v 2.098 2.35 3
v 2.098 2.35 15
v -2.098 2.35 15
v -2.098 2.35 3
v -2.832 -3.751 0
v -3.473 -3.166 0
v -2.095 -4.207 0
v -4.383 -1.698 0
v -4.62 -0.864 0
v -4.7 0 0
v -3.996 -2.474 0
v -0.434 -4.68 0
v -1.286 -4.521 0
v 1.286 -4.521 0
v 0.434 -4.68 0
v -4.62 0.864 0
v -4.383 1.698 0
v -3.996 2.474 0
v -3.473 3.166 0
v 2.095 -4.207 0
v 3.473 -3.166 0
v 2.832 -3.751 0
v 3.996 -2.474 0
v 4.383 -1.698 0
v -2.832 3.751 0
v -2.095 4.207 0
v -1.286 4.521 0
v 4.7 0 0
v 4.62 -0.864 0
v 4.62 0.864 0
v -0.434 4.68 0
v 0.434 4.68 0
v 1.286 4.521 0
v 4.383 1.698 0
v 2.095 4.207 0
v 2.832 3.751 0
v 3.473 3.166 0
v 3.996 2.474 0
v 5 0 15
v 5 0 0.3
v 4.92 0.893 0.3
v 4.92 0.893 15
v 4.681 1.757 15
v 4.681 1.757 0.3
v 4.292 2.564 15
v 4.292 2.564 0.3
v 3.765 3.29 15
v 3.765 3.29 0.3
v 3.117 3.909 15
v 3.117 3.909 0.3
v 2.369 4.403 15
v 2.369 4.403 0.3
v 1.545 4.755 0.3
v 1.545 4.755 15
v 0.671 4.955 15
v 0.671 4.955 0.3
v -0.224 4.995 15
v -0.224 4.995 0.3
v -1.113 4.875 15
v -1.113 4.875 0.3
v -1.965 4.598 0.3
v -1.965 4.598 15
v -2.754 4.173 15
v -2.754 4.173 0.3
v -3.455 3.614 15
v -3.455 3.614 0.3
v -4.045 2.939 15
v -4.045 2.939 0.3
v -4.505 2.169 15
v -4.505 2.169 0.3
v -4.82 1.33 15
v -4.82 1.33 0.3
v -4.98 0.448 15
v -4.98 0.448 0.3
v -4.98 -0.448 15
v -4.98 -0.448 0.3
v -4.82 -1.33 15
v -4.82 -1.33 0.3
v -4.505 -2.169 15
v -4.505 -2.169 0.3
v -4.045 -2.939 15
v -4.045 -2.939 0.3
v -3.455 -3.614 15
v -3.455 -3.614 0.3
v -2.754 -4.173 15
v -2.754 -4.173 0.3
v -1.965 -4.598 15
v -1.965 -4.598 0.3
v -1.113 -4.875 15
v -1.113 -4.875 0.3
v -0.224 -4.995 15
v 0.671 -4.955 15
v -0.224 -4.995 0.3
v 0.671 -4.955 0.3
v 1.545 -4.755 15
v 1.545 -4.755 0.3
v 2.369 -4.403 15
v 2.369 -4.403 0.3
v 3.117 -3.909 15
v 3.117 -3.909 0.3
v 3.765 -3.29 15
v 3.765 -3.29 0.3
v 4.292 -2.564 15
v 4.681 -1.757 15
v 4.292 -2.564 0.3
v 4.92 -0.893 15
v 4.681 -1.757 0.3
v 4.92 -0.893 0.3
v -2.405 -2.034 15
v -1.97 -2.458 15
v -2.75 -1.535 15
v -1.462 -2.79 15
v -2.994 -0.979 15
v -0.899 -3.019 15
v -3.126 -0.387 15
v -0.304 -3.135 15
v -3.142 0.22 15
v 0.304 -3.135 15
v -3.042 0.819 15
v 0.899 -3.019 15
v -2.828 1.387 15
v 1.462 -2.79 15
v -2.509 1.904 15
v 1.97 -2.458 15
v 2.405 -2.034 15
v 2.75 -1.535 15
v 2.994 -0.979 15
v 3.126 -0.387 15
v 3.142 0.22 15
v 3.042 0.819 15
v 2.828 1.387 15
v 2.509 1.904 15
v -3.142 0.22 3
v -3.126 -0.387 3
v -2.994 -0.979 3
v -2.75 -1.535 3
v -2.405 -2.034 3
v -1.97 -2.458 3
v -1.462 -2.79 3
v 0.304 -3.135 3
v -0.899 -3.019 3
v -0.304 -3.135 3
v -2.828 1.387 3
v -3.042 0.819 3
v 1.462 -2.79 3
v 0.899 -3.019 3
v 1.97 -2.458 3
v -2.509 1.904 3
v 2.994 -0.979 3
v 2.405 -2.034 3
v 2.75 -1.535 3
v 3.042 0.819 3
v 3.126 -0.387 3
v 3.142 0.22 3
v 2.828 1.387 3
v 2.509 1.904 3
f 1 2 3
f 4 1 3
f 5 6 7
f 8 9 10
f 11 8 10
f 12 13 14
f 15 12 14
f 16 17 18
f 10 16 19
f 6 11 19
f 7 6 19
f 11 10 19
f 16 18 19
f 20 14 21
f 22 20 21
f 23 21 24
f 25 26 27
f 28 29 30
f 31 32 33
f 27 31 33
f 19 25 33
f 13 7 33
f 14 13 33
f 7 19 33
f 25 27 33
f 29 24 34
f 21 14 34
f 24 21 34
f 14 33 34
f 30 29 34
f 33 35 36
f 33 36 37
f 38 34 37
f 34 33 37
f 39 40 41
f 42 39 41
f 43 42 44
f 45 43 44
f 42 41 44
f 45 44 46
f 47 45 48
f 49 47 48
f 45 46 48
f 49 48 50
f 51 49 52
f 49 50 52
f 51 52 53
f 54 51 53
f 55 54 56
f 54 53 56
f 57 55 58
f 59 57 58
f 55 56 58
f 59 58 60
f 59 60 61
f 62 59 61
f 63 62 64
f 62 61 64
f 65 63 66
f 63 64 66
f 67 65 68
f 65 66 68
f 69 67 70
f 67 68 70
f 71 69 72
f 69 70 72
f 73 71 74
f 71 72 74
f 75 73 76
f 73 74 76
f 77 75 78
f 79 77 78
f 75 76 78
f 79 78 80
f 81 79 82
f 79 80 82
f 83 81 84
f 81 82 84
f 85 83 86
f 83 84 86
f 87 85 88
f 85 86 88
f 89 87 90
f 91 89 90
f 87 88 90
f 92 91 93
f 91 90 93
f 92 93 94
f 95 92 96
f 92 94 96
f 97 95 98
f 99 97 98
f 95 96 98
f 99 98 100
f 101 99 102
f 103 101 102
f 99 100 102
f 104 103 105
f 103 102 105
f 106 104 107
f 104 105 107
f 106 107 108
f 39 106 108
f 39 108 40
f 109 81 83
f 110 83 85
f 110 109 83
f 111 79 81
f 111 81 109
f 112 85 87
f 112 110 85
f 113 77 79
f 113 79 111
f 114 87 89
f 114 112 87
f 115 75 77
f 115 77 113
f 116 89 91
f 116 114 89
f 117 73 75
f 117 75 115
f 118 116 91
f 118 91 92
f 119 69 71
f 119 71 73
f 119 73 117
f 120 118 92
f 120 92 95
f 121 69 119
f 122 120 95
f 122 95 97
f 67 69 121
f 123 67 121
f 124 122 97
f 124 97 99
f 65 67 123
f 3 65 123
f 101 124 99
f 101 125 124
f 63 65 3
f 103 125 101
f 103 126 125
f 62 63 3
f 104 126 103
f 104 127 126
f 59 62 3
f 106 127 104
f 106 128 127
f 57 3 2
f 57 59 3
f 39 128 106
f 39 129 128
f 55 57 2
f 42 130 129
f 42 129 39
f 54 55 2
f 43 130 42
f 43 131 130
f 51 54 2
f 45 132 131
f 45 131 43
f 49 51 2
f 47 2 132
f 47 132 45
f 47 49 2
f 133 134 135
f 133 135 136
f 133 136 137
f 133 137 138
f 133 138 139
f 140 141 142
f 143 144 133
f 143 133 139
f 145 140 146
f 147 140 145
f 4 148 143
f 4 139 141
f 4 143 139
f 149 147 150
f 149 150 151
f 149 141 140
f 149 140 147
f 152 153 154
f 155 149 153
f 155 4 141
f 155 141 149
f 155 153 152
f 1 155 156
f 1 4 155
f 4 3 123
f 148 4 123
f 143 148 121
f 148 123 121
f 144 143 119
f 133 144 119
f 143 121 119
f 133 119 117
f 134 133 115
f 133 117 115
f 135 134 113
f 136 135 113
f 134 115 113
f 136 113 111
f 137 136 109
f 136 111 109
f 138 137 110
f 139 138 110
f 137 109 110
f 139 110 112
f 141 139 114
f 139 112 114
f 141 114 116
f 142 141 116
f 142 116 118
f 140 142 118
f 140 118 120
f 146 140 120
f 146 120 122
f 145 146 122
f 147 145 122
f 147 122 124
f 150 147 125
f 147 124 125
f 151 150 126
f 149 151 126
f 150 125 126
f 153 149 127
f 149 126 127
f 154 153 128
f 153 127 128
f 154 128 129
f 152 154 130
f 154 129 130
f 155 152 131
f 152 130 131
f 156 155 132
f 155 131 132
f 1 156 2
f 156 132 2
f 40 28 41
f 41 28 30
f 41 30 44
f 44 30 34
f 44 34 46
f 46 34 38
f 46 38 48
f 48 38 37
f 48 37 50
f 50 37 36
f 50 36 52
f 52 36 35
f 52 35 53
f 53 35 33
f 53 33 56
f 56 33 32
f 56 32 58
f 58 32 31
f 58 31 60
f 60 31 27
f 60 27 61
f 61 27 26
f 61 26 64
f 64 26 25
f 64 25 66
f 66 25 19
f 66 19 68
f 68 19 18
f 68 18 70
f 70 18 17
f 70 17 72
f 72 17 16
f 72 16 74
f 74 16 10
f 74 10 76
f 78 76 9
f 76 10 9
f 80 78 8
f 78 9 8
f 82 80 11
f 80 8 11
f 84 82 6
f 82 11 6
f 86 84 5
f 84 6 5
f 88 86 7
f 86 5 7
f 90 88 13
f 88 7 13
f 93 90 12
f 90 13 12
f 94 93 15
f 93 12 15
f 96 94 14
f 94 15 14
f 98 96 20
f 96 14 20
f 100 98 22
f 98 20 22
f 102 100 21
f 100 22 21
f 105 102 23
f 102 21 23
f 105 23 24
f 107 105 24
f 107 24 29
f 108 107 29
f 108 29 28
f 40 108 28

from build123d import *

# Parameters (mm, degrees)
F0_R     = 5
F1_DEPTH = 15
F3_DEPTH = 12
F4_SIZE  = 0.3


with BuildPart() as f1:
    # F0 (on Top) → F1 (new body)
    with BuildSketch(Plane.XY):
        Circle(F0_R)
    extrude(amount=F1_DEPTH)

    # F2 (on face) → F3 (cut)
    with BuildSketch(Plane.XY.offset(15)):
        with BuildLine():
            Line((2.097618, 2.35), (-2.097618, 2.35))
            ThreePointArc((-2.097618, 2.35), (0, -3.15), (2.097618, 2.35))
        make_face()
    extrude(amount=-F3_DEPTH, mode=Mode.SUBTRACT)

    # F4
    f4_edges = [f1.edges().sort_by_distance(p)[0] for p in [
        (-5, 0, 0),
    ]]
    chamfer(f4_edges, length=F4_SIZE)


solid = f1.part
